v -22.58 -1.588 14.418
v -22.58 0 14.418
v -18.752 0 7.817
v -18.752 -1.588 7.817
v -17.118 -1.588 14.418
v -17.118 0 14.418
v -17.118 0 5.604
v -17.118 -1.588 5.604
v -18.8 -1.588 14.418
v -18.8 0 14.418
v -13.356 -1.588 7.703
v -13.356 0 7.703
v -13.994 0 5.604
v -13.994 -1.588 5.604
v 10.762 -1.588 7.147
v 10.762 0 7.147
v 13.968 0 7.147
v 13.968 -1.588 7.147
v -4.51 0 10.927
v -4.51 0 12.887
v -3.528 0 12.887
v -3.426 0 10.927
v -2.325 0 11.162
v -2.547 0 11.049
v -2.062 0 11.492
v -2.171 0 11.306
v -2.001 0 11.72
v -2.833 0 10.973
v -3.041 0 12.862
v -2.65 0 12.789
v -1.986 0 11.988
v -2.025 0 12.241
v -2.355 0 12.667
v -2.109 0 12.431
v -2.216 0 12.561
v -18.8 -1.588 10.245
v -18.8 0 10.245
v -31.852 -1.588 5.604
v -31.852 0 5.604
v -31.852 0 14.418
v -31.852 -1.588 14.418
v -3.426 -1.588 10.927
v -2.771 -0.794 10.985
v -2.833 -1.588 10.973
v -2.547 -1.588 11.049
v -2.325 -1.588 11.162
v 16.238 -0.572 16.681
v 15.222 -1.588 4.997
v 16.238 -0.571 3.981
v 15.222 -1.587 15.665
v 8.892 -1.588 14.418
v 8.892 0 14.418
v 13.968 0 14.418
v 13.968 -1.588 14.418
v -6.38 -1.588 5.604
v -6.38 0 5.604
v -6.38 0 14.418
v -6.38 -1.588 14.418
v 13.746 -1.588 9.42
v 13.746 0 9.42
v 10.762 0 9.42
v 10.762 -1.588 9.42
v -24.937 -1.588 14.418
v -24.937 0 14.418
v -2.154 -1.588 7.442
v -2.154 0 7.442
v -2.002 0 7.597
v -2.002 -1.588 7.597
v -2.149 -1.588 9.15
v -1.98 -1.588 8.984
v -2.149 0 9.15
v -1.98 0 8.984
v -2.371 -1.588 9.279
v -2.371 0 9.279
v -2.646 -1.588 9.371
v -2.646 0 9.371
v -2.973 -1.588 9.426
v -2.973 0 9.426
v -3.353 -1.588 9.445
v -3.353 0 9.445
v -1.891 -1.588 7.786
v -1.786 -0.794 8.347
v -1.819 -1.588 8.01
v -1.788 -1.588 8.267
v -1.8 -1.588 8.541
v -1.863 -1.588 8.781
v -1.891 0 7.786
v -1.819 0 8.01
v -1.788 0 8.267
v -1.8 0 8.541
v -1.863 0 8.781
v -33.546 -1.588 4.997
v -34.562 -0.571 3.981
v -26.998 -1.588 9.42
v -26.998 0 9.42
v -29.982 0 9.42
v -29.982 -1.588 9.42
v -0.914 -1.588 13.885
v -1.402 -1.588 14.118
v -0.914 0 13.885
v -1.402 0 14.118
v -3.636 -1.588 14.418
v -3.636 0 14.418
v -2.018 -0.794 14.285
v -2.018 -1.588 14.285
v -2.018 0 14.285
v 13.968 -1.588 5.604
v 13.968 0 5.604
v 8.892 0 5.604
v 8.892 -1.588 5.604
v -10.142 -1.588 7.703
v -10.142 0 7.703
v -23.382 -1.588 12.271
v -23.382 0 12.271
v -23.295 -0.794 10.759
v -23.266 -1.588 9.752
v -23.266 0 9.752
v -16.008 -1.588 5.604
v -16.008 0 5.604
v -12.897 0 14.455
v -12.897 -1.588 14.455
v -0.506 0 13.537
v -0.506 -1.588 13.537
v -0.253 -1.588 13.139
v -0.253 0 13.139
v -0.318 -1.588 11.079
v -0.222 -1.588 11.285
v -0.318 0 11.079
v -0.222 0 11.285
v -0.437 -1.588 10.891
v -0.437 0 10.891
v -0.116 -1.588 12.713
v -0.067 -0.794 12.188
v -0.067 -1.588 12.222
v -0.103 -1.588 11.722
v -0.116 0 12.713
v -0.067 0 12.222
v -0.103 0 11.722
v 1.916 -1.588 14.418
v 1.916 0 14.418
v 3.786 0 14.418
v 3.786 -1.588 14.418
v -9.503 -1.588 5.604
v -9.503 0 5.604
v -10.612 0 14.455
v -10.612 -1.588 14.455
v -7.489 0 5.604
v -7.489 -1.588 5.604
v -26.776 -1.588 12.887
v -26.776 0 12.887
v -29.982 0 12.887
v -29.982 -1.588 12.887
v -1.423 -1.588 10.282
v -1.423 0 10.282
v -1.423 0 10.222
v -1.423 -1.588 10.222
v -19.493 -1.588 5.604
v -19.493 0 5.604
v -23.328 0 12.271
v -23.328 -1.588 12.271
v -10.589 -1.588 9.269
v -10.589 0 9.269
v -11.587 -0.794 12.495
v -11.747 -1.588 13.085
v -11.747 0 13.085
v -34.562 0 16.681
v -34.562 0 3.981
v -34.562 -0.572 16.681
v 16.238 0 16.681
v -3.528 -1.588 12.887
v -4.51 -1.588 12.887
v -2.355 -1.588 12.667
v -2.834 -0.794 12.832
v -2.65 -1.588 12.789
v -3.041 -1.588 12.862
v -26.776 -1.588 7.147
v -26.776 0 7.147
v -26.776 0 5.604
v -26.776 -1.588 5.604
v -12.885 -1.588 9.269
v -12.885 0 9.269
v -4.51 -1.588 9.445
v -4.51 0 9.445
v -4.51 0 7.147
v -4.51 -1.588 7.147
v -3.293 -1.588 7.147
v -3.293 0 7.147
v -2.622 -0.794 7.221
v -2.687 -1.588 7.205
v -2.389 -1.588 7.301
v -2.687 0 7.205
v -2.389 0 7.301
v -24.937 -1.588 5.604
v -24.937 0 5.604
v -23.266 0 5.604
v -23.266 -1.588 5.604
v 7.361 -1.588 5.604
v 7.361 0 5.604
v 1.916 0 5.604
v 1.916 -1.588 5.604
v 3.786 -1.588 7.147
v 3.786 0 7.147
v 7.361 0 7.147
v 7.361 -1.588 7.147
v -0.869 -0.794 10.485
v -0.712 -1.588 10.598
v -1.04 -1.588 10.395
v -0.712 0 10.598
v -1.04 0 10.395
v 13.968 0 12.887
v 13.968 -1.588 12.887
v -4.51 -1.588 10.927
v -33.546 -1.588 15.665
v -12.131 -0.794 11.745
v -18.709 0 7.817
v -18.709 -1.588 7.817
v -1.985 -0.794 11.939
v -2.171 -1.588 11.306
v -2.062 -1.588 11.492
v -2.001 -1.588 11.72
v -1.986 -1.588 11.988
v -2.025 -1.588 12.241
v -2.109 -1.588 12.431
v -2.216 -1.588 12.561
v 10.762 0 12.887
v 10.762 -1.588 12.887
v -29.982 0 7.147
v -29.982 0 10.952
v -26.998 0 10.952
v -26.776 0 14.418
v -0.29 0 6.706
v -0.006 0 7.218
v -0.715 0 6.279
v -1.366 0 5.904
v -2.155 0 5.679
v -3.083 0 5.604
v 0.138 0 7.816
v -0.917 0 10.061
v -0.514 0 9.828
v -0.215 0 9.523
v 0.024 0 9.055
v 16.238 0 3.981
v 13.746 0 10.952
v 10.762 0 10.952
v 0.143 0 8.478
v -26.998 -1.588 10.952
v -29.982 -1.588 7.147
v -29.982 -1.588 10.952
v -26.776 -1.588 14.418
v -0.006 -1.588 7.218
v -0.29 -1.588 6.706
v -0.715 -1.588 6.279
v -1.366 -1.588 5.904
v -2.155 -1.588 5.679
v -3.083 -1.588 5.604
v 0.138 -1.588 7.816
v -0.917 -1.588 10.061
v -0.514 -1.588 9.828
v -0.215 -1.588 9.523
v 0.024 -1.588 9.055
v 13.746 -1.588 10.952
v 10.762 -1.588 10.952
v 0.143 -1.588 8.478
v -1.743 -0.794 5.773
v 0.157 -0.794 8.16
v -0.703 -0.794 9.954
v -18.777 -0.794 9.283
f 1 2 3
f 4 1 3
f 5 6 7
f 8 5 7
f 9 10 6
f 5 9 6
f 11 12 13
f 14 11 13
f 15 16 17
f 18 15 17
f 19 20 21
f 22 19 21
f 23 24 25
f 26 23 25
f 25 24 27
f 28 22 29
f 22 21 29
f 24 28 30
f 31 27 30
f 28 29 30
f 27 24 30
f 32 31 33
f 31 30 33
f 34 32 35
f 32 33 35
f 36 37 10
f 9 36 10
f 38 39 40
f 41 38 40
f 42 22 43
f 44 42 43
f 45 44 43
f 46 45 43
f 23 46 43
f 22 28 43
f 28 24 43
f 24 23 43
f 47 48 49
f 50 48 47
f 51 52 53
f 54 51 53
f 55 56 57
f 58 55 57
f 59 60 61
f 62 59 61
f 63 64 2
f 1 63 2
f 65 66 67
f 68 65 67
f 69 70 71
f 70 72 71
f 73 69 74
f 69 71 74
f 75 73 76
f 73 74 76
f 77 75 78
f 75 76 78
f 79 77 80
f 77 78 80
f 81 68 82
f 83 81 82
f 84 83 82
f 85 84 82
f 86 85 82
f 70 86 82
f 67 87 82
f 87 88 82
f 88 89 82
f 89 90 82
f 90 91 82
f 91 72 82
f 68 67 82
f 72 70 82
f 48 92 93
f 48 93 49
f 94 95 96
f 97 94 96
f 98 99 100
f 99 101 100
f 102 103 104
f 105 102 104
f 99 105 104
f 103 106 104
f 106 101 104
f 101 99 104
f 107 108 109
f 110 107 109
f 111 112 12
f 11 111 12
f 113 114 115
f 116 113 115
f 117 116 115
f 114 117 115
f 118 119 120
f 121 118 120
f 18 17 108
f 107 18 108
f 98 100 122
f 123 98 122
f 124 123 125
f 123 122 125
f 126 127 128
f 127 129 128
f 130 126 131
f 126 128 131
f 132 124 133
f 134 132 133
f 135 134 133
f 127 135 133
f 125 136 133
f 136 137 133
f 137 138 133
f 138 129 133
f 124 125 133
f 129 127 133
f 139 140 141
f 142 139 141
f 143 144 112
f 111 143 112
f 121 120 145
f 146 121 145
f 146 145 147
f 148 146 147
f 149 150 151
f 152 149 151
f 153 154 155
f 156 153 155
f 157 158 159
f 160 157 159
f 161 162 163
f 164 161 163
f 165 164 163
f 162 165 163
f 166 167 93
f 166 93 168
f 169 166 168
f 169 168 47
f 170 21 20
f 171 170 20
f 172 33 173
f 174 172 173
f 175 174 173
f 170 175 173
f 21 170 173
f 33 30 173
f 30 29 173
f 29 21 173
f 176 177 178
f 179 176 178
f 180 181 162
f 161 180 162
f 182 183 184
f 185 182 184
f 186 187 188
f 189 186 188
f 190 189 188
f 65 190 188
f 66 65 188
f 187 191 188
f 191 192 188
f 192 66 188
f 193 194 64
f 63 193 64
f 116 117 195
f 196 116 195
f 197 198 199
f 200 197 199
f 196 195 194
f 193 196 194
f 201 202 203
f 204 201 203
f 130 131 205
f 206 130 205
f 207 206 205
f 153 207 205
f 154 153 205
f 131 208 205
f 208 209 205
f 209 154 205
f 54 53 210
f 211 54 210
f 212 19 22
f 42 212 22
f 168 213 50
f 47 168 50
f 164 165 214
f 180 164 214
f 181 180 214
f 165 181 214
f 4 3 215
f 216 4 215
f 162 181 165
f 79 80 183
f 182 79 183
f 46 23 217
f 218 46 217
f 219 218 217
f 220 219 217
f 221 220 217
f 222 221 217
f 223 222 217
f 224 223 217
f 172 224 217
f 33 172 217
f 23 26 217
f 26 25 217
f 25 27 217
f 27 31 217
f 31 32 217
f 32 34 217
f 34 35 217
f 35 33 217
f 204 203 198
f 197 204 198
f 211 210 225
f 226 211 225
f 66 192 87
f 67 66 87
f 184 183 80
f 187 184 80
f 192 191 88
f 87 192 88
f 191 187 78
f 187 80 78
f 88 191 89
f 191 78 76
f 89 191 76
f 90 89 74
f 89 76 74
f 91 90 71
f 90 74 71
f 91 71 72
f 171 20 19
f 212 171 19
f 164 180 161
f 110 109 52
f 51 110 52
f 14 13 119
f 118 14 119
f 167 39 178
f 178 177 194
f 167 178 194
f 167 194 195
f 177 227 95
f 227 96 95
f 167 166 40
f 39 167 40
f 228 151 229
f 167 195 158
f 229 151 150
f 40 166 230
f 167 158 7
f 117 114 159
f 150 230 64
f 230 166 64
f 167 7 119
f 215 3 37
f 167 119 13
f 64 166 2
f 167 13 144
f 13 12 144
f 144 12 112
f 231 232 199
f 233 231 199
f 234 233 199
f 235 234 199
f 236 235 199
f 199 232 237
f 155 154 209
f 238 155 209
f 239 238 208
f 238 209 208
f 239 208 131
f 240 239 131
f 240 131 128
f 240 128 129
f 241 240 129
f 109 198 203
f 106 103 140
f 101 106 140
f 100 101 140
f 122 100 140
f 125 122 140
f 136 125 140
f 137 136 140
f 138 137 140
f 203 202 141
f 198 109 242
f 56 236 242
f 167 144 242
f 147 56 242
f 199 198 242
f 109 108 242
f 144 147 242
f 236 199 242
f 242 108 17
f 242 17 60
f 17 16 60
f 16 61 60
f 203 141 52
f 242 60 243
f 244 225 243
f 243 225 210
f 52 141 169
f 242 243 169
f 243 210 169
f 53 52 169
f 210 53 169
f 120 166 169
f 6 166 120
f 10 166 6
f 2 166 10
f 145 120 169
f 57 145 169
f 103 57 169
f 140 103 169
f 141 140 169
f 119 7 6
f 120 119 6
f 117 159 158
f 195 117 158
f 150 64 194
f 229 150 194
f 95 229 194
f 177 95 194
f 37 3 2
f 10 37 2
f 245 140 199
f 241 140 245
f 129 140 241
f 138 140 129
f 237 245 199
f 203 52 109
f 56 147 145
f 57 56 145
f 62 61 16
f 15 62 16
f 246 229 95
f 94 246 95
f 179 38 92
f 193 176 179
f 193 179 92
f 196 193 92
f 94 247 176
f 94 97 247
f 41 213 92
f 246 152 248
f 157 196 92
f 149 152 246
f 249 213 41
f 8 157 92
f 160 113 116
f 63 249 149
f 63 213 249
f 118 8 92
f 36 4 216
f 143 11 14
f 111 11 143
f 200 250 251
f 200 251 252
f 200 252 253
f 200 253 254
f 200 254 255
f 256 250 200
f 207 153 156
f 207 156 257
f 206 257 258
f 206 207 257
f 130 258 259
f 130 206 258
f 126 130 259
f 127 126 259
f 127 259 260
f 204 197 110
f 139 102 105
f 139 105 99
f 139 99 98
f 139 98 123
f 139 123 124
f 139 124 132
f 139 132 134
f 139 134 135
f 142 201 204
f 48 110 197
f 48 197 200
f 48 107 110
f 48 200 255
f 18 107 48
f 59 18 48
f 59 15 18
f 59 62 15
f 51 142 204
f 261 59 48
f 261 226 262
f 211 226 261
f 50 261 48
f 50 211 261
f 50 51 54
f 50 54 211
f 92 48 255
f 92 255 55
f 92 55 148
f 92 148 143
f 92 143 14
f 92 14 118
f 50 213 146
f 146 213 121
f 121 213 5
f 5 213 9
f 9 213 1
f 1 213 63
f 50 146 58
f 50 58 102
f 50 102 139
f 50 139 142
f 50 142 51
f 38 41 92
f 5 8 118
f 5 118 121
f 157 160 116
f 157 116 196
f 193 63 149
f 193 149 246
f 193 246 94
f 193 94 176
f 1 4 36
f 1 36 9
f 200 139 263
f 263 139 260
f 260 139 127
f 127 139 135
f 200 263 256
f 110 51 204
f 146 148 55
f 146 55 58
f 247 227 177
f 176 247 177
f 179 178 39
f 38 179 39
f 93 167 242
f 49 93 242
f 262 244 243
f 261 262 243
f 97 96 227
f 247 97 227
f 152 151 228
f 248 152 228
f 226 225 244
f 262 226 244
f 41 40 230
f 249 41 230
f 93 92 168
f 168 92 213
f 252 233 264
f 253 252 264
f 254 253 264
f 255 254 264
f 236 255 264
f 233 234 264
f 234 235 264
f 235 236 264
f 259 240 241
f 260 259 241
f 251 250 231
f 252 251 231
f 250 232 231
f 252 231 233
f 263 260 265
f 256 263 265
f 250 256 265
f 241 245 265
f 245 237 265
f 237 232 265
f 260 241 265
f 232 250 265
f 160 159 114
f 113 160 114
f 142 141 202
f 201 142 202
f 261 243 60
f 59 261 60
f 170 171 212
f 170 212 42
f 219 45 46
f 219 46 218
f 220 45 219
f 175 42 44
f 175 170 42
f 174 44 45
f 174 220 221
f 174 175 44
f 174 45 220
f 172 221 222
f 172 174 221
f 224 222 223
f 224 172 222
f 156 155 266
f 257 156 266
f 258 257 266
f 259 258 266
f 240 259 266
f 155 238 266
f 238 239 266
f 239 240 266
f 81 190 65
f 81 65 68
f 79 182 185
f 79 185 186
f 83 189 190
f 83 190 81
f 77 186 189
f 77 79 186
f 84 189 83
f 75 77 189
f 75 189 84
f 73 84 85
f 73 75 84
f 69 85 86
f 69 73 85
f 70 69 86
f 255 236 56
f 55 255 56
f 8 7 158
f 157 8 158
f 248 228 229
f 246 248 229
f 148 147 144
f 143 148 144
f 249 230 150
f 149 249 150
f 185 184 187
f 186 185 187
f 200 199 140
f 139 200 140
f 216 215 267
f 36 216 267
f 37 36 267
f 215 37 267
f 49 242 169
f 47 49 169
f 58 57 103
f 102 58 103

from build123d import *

# Parameters (mm, degrees)
F0_W     = 50.8
F0_H     = 12.7
F1_DEPTH = 1.5875
F2_SIZE  = 1.016


with BuildPart() as f1:
    # F0 (on Front) → F1 (new body)
    with BuildSketch(Plane.XZ):
        with Locations((-9.1615320603, 10.3311909613)):
            Rectangle(F0_W, F0_H)
        Polygon((-26.7756625529, 7.1471016441), (-26.7756625529, 5.6036988663), (-31.8515284383, 5.6036988663), (-31.8515284383, 14.4184579809), (-26.7756625529, 14.4184579809), (-26.7756625529, 12.886630724), (-29.9820818238, 12.886630724), (-29.9820818238, 10.9515894913), (-26.9975267022, 10.9515894913), (-26.9975267022, 9.4197622344), (-29.9820818238, 9.4197622344), (-29.9820818238, 7.1471016441), align=None, mode=Mode.SUBTRACT)
        with BuildLine():
            Line((-17.117819671, 14.4184579809), (-17.117819671, 5.6036988663))
            Line((-17.117819671, 5.6036988663), (-19.4927306953, 5.6036988663))
            Line((-19.4927306953, 5.6036988663), (-23.3280865981, 12.2711988663))
            Line((-23.3280865981, 12.2711988663), (-23.3821056953, 12.2711988663))
            add(Edge.make_bspline(
                [(-23.3821056953, 12.2711988663), (-23.266350487, 10.5059319393), (-23.266350487, 9.7515938316)],
                knots=[0, 0, 0, 1, 1, 1], degree=2))
            Line((-23.266350487, 9.7515938316), (-23.266350487, 5.6036988663))
            Line((-23.266350487, 5.6036988663), (-24.9370839939, 5.6036988663))
            Line((-24.9370839939, 5.6036988663), (-24.9370839939, 14.4184579809))
            Line((-24.9370839939, 14.4184579809), (-22.5795362508, 14.4184579809))
            Line((-22.5795362508, 14.4184579809), (-18.751897362, 7.816552599))
            Line((-18.751897362, 7.816552599), (-18.7094537856, 7.816552599))
            add(Edge.make_bspline(
                [(-18.7094537856, 7.816552599), (-18.8001286988, 9.5355174427), (-18.8001286988, 10.2454827205)],
                knots=[0, 0, 0, 1, 1, 1], degree=2))
            Line((-18.8001286988, 10.2454827205), (-18.8001286988, 14.4184579809))
            Line((-18.8001286988, 14.4184579809), (-17.117819671, 14.4184579809))
        make_face(mode=Mode.SUBTRACT)
        Polygon((-7.4889155911, 5.6036988663), (-9.5030562161, 5.6036988663), (-10.1416391154, 7.7027266441), (-13.3557754001, 7.7027266441), (-13.9943582995, 5.6036988663), (-16.0084989245, 5.6036988663), (-12.8966130738, 14.4551137969), (-10.6123769626, 14.4551137969), align=None, mode=Mode.SUBTRACT)
        with BuildLine():
            Line((-6.3795948446, 5.6036988663), (-6.3795948446, 14.4184579809))
            Line((-6.3795948446, 14.4184579809), (-3.6361964071, 14.4184579809))
            add(Edge.make_bspline(
                [(-3.6361964071, 14.4184579809), (-1.7609620321, 14.4184579809), (-0.9140197578, 13.8850193959)],
                knots=[0, 0, 0, 1, 1, 1], degree=2))
            add(Edge.make_bspline(
                [(-0.9140197578, 13.8850193959), (-0.0670774835, 13.3515808108), (-0.0670774835, 12.188240967)],
                knots=[0, 0, 0, 1, 1, 1], degree=2))
            add(Edge.make_bspline(
                [(-0.0670774835, 12.188240967), (-0.0670774835, 11.3972470434), (-0.4374941501, 10.890818007)],
                knots=[0, 0, 0, 1, 1, 1], degree=2))
            add(Edge.make_bspline(
                [(-0.4374941501, 10.890818007), (-0.8079108168, 10.3843889705), (-1.4233426745, 10.2821385365)],
                knots=[0, 0, 0, 1, 1, 1], degree=2))
            Line((-1.4233426745, 10.2821385365), (-1.4233426745, 10.2223316788))
            add(Edge.make_bspline(
                [(-1.4233426745, 10.2223316788), (-0.5860466675, 10.035194092), (-0.2146653741, 9.5229772952)],
                knots=[0, 0, 0, 1, 1, 1], degree=2))
            add(Edge.make_bspline(
                [(-0.2146653741, 9.5229772952), (0.1567159193, 9.0107604983), (0.1567159193, 8.159959717)],
                knots=[0, 0, 0, 1, 1, 1], degree=2))
            add(Edge.make_bspline(
                [(0.1567159193, 8.159959717), (0.1567159193, 6.9541762969), (-0.7153066501, 6.2789375816)],
                knots=[0, 0, 0, 1, 1, 1], degree=2))
            add(Edge.make_bspline(
                [(-0.7153066501, 6.2789375816), (-1.5873292196, 5.6036988663), (-3.0825006606, 5.6036988663)],
                knots=[0, 0, 0, 1, 1, 1], degree=2))
            Line((-3.0825006606, 5.6036988663), (-6.3795948446, 5.6036988663))
        make_face(mode=Mode.SUBTRACT)
        Polygon((7.3605483846, 5.6036988663), (1.916195086, 5.6036988663), (1.916195086, 14.4184579809), (3.7856417005, 14.4184579809), (3.7856417005, 7.1471016441), (7.3605483846, 7.1471016441), align=None, mode=Mode.SUBTRACT)
        Polygon((13.9682415269, 7.1471016441), (13.9682415269, 5.6036988663), (8.8923756415, 5.6036988663), (8.8923756415, 14.4184579809), (13.9682415269, 14.4184579809), (13.9682415269, 12.886630724), (10.7618222561, 12.886630724), (10.7618222561, 10.9515894913), (13.7463773776, 10.9515894913), (13.7463773776, 9.4197622344), (10.7618222561, 9.4197622344), (10.7618222561, 7.1471016441), align=None, mode=Mode.SUBTRACT)
    extrude(amount=F1_DEPTH)

    # F2
    f2_edges = [f1.edges().sort_by_distance(p)[0] for p in [
        (-9.161532, -1.5875, 3.981191),
        (-34.561532, -1.5875, 10.331191),
        (-9.161532, -1.5875, 16.681191),
        (16.238468, -1.5875, 10.331191),
    ]]
    chamfer(f2_edges, length=F2_SIZE)


with BuildPart() as f1b:
    # F0 (on Front) → F1, piece 2 (new body)
    with BuildSketch(Plane.XZ):
        with BuildLine():
            Line((-3.3525961467, 9.4448425295), (-4.51014823, 9.4448425295))
            Line((-4.51014823, 9.4448425295), (-4.51014823, 7.1471016441))
            Line((-4.51014823, 7.1471016441), (-3.292789289, 7.1471016441))
            add(Edge.make_bspline(
                [(-3.292789289, 7.1471016441), (-2.5210879001, 7.1471016441), (-2.1535651137, 7.4422774254)],
                knots=[0, 0, 0, 1, 1, 1], degree=2))
            add(Edge.make_bspline(
                [(-2.1535651137, 7.4422774254), (-1.7860423272, 7.7374532066), (-1.7860423272, 8.3470973038)],
                knots=[0, 0, 0, 1, 1, 1], degree=2))
            add(Edge.make_bspline(
                [(-1.7860423272, 8.3470973038), (-1.7860423272, 9.4448425295), (-3.3525961467, 9.4448425295)],
                knots=[0, 0, 0, 1, 1, 1], degree=2))
        make_face()
    extrude(amount=F1_DEPTH)


with BuildPart() as f1c:
    # F0 (on Front) → F1, piece 3 (new body)
    with BuildSketch(Plane.XZ):
        with BuildLine():
            Line((-12.8850375529, 9.2692804636), (-10.589225921, 9.2692804636))
            add(Edge.make_bspline(
                [(-10.589225921, 9.2692804636), (-11.4747532647, 12.1207170955), (-11.5866499661, 12.4949922691)],
                knots=[0, 0, 0, 1, 1, 1], degree=2))
            add(Edge.make_bspline(
                [(-11.5866499661, 12.4949922691), (-11.6985466675, 12.8692674427), (-11.7467780043, 13.0853438316)],
                knots=[0, 0, 0, 1, 1, 1], degree=2))
            add(Edge.make_bspline(
                [(-11.7467780043, 13.0853438316), (-11.945491112, 12.3136424427), (-12.8850375529, 9.2692804636)],
                knots=[0, 0, 0, 1, 1, 1], degree=2))
        make_face()
    extrude(amount=F1_DEPTH)


with BuildPart() as f1d:
    # F0 (on Front) → F1, piece 4 (new body)
    with BuildSketch(Plane.XZ):
        with BuildLine():
            Line((-4.51014823, 12.886630724), (-4.51014823, 10.9265091962))
            Line((-4.51014823, 10.9265091962), (-3.4259077786, 10.9265091962))
            add(Edge.make_bspline(
                [(-3.4259077786, 10.9265091962), (-2.6657819106, 10.9265091962), (-2.3252686727, 11.1618781198)],
                knots=[0, 0, 0, 1, 1, 1], degree=2))
            add(Edge.make_bspline(
                [(-2.3252686727, 11.1618781198), (-1.9847554349, 11.3972470434), (-1.9847554349, 11.9393672691)],
                knots=[0, 0, 0, 1, 1, 1], degree=2))
            add(Edge.make_bspline(
                [(-1.9847554349, 11.9393672691), (-1.9847554349, 12.4467609323), (-2.3551721015, 12.6666958282)],
                knots=[0, 0, 0, 1, 1, 1], degree=2))
            add(Edge.make_bspline(
                [(-2.3551721015, 12.6666958282), (-2.7255887682, 12.886630724), (-3.5281582126, 12.886630724)],
                knots=[0, 0, 0, 1, 1, 1], degree=2))
            Line((-3.5281582126, 12.886630724), (-4.51014823, 12.886630724))
        make_face()
    extrude(amount=F1_DEPTH)


solid = Compound([f1.part, f1b.part, f1c.part, f1d.part])
